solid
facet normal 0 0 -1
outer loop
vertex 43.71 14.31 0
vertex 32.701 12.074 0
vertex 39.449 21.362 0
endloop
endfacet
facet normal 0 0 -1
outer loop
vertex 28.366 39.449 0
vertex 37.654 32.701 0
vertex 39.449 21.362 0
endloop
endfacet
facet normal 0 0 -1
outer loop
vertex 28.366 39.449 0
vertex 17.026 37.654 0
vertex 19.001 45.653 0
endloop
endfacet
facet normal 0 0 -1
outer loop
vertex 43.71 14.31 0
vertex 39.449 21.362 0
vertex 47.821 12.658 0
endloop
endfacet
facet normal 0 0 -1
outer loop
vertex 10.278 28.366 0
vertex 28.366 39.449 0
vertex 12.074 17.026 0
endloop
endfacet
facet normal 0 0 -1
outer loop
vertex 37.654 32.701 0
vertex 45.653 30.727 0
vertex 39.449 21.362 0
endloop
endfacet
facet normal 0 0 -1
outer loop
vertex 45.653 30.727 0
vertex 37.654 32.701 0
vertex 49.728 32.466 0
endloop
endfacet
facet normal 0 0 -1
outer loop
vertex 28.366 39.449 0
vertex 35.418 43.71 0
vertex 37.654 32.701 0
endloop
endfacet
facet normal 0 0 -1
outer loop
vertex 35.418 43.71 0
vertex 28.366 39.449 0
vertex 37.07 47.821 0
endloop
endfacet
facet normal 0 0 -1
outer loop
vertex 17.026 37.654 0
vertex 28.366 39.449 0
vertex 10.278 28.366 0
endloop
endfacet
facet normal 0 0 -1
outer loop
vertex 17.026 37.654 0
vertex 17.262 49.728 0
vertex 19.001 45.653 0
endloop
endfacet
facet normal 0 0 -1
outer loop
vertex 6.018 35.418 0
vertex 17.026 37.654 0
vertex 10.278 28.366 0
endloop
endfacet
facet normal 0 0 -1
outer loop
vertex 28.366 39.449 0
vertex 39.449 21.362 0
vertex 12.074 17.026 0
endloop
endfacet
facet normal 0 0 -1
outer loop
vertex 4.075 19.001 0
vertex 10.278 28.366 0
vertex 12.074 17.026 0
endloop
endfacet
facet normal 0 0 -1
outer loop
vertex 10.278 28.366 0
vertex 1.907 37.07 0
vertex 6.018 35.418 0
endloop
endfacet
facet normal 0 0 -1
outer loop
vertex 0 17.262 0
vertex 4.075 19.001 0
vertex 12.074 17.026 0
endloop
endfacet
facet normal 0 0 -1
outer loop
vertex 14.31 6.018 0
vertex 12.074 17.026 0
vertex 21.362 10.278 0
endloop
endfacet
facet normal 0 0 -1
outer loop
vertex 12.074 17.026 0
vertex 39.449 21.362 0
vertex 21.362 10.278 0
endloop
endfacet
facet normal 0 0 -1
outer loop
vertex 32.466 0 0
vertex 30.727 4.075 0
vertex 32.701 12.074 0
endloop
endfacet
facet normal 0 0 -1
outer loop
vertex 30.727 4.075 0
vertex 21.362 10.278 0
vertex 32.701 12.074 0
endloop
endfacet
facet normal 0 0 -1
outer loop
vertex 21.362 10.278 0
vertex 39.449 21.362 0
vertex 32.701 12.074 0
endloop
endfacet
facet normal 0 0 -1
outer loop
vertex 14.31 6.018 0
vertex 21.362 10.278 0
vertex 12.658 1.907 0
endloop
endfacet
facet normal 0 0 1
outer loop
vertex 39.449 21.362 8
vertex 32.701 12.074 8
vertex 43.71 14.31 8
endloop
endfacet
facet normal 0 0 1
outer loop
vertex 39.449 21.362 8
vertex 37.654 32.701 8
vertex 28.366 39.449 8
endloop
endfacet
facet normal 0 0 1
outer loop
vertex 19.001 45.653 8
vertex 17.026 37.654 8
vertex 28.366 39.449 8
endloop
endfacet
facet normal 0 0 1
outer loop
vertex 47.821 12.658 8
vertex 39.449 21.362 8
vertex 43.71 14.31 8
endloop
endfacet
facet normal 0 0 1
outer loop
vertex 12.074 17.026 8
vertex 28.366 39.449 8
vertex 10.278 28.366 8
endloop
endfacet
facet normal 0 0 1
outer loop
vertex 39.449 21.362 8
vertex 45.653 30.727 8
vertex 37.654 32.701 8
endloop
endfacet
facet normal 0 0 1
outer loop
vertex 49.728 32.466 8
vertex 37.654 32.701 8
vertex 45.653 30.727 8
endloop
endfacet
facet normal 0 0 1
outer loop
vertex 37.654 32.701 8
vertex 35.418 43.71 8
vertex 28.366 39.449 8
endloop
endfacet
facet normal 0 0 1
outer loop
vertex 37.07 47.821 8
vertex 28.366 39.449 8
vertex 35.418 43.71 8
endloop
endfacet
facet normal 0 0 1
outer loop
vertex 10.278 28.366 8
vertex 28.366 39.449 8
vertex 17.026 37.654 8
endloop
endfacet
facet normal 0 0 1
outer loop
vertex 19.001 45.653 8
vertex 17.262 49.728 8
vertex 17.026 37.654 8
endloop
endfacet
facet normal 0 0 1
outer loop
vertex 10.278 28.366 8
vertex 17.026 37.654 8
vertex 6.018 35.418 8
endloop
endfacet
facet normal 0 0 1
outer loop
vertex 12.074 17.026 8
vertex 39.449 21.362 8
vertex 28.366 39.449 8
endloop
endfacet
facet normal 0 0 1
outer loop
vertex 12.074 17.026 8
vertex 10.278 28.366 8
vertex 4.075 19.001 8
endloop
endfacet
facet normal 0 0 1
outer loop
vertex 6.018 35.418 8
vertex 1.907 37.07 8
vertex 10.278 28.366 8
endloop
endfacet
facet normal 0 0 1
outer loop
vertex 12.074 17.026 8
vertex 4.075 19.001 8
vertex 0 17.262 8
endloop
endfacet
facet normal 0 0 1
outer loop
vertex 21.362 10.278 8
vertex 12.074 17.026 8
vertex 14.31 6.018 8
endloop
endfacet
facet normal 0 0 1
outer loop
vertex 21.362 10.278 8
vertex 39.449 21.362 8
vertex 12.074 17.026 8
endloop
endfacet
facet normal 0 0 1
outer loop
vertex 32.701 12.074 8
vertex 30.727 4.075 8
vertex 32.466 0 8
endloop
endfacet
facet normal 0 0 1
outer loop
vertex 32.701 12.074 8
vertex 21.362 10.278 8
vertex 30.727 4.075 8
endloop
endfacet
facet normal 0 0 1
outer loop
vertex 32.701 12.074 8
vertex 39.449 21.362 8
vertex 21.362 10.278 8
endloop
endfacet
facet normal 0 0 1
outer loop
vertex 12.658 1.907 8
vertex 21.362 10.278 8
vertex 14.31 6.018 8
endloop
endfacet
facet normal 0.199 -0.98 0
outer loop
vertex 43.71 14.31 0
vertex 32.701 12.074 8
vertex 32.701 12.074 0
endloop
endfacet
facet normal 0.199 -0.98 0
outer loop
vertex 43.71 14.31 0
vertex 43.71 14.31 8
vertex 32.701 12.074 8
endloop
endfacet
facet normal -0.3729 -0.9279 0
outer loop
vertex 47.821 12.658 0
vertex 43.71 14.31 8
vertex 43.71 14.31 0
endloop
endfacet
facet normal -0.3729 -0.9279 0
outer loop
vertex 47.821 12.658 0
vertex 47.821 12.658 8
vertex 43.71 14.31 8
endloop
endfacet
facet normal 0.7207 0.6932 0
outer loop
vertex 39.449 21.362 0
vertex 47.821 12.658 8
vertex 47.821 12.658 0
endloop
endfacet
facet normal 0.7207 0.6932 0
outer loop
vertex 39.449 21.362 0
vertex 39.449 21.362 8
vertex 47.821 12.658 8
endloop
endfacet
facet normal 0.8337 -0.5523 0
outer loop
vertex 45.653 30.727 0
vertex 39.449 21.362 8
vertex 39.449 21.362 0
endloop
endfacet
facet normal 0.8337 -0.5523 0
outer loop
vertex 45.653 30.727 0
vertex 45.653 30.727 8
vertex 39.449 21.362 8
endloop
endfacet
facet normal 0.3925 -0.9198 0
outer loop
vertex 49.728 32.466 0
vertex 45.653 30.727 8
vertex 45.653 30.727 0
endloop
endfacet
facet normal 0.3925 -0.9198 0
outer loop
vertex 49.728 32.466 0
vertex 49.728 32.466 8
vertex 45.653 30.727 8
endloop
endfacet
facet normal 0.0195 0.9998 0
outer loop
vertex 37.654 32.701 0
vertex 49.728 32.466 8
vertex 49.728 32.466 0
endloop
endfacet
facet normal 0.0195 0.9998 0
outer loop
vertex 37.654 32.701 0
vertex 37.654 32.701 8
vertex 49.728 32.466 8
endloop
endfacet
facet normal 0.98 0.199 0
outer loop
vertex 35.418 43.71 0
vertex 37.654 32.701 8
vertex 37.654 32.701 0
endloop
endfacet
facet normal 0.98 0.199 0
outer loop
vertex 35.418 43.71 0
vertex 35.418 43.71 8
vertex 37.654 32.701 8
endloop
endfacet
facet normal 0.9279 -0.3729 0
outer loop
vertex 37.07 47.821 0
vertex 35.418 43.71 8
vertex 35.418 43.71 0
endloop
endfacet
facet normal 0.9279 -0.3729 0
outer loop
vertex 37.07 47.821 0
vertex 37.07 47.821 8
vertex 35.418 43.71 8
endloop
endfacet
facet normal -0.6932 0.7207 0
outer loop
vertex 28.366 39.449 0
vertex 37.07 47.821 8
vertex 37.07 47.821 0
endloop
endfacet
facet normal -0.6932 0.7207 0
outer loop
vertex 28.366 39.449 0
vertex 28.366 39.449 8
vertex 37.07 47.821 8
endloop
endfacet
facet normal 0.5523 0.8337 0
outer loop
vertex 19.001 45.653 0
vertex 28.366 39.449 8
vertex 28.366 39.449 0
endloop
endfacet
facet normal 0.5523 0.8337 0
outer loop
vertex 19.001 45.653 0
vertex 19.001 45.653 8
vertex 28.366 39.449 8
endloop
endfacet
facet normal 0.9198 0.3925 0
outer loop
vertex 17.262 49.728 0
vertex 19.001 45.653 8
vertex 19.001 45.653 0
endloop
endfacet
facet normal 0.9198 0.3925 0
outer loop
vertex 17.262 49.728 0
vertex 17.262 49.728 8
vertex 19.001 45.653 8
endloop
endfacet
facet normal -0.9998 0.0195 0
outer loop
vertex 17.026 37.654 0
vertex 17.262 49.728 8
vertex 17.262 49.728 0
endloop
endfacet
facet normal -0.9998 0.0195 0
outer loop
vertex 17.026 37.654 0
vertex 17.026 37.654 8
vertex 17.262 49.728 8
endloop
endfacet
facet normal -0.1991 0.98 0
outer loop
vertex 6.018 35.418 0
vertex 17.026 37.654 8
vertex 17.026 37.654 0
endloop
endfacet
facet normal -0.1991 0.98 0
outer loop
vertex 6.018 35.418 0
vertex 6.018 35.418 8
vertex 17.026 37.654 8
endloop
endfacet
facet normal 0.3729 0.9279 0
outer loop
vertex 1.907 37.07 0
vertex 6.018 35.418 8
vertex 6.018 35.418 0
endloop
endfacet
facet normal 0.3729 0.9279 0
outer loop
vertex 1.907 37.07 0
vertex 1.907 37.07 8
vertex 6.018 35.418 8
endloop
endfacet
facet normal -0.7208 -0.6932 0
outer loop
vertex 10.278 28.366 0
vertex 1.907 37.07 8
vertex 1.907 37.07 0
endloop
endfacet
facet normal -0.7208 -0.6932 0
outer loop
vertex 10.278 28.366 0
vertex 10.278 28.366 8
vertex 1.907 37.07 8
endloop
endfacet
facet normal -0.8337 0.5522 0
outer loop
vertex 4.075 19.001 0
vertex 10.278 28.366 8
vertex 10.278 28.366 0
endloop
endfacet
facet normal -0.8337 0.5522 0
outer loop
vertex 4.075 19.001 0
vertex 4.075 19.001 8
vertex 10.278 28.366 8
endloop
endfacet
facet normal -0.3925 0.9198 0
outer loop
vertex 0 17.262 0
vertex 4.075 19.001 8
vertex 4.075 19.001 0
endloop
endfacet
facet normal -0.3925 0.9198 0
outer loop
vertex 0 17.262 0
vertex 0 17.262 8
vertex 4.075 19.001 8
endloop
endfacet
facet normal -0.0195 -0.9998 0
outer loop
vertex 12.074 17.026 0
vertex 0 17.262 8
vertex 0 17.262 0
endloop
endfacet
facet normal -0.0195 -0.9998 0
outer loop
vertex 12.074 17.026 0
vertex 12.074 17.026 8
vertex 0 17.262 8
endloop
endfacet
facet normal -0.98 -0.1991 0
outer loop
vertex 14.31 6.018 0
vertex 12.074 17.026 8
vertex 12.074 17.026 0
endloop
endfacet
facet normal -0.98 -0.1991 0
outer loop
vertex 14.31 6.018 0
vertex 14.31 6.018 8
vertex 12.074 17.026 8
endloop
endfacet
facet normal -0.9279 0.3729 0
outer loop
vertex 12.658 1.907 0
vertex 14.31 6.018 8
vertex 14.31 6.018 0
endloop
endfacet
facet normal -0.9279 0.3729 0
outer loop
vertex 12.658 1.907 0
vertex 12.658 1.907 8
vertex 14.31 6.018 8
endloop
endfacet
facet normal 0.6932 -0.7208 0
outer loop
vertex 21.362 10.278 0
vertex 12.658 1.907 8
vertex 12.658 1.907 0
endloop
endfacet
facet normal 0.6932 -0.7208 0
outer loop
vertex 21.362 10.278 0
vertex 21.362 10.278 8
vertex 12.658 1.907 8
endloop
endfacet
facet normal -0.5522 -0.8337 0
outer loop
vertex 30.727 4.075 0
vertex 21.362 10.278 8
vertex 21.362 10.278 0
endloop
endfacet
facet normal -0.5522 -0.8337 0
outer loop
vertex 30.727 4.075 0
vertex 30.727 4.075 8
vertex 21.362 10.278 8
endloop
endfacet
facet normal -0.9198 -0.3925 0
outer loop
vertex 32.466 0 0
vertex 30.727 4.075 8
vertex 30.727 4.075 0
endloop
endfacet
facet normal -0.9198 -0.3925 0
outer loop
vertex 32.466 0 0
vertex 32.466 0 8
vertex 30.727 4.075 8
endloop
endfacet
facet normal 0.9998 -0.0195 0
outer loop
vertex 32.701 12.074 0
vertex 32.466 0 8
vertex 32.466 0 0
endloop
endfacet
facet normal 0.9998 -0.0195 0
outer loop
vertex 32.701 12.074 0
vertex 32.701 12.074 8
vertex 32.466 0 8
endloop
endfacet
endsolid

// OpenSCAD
$fn = 32;

// ----------------------------------------------------------------------
// Fan rotor section: 8 blades, 15 mm hub radius, 11 mm blades
// ----------------------------------------------------------------------

// --- parameters (mm) ---
profile_height = 8;       // extrusion height
profile_points = 24;      // points of the closed outline

profile = [[39.449, 21.362], [45.653, 30.727], [49.728, 32.466], [37.654, 32.701], [35.418, 43.71], [37.07, 47.821], [28.366, 39.449], [19.001, 45.653], [17.262, 49.728], [17.026, 37.654], [6.018, 35.418], [1.907, 37.07], [10.278, 28.366], [4.075, 19.001], [0, 17.262], [12.074, 17.026], [14.31, 6.018], [12.658, 1.907], [21.362, 10.278], [30.727, 4.075], [32.466, 0], [32.701, 12.074], [43.71, 14.31], [47.821, 12.658]];  // single closed polygon, 24 points, counter clockwise

// --- the one profile operation ---
linear_extrude(height = profile_height) polygon(points = profile);
